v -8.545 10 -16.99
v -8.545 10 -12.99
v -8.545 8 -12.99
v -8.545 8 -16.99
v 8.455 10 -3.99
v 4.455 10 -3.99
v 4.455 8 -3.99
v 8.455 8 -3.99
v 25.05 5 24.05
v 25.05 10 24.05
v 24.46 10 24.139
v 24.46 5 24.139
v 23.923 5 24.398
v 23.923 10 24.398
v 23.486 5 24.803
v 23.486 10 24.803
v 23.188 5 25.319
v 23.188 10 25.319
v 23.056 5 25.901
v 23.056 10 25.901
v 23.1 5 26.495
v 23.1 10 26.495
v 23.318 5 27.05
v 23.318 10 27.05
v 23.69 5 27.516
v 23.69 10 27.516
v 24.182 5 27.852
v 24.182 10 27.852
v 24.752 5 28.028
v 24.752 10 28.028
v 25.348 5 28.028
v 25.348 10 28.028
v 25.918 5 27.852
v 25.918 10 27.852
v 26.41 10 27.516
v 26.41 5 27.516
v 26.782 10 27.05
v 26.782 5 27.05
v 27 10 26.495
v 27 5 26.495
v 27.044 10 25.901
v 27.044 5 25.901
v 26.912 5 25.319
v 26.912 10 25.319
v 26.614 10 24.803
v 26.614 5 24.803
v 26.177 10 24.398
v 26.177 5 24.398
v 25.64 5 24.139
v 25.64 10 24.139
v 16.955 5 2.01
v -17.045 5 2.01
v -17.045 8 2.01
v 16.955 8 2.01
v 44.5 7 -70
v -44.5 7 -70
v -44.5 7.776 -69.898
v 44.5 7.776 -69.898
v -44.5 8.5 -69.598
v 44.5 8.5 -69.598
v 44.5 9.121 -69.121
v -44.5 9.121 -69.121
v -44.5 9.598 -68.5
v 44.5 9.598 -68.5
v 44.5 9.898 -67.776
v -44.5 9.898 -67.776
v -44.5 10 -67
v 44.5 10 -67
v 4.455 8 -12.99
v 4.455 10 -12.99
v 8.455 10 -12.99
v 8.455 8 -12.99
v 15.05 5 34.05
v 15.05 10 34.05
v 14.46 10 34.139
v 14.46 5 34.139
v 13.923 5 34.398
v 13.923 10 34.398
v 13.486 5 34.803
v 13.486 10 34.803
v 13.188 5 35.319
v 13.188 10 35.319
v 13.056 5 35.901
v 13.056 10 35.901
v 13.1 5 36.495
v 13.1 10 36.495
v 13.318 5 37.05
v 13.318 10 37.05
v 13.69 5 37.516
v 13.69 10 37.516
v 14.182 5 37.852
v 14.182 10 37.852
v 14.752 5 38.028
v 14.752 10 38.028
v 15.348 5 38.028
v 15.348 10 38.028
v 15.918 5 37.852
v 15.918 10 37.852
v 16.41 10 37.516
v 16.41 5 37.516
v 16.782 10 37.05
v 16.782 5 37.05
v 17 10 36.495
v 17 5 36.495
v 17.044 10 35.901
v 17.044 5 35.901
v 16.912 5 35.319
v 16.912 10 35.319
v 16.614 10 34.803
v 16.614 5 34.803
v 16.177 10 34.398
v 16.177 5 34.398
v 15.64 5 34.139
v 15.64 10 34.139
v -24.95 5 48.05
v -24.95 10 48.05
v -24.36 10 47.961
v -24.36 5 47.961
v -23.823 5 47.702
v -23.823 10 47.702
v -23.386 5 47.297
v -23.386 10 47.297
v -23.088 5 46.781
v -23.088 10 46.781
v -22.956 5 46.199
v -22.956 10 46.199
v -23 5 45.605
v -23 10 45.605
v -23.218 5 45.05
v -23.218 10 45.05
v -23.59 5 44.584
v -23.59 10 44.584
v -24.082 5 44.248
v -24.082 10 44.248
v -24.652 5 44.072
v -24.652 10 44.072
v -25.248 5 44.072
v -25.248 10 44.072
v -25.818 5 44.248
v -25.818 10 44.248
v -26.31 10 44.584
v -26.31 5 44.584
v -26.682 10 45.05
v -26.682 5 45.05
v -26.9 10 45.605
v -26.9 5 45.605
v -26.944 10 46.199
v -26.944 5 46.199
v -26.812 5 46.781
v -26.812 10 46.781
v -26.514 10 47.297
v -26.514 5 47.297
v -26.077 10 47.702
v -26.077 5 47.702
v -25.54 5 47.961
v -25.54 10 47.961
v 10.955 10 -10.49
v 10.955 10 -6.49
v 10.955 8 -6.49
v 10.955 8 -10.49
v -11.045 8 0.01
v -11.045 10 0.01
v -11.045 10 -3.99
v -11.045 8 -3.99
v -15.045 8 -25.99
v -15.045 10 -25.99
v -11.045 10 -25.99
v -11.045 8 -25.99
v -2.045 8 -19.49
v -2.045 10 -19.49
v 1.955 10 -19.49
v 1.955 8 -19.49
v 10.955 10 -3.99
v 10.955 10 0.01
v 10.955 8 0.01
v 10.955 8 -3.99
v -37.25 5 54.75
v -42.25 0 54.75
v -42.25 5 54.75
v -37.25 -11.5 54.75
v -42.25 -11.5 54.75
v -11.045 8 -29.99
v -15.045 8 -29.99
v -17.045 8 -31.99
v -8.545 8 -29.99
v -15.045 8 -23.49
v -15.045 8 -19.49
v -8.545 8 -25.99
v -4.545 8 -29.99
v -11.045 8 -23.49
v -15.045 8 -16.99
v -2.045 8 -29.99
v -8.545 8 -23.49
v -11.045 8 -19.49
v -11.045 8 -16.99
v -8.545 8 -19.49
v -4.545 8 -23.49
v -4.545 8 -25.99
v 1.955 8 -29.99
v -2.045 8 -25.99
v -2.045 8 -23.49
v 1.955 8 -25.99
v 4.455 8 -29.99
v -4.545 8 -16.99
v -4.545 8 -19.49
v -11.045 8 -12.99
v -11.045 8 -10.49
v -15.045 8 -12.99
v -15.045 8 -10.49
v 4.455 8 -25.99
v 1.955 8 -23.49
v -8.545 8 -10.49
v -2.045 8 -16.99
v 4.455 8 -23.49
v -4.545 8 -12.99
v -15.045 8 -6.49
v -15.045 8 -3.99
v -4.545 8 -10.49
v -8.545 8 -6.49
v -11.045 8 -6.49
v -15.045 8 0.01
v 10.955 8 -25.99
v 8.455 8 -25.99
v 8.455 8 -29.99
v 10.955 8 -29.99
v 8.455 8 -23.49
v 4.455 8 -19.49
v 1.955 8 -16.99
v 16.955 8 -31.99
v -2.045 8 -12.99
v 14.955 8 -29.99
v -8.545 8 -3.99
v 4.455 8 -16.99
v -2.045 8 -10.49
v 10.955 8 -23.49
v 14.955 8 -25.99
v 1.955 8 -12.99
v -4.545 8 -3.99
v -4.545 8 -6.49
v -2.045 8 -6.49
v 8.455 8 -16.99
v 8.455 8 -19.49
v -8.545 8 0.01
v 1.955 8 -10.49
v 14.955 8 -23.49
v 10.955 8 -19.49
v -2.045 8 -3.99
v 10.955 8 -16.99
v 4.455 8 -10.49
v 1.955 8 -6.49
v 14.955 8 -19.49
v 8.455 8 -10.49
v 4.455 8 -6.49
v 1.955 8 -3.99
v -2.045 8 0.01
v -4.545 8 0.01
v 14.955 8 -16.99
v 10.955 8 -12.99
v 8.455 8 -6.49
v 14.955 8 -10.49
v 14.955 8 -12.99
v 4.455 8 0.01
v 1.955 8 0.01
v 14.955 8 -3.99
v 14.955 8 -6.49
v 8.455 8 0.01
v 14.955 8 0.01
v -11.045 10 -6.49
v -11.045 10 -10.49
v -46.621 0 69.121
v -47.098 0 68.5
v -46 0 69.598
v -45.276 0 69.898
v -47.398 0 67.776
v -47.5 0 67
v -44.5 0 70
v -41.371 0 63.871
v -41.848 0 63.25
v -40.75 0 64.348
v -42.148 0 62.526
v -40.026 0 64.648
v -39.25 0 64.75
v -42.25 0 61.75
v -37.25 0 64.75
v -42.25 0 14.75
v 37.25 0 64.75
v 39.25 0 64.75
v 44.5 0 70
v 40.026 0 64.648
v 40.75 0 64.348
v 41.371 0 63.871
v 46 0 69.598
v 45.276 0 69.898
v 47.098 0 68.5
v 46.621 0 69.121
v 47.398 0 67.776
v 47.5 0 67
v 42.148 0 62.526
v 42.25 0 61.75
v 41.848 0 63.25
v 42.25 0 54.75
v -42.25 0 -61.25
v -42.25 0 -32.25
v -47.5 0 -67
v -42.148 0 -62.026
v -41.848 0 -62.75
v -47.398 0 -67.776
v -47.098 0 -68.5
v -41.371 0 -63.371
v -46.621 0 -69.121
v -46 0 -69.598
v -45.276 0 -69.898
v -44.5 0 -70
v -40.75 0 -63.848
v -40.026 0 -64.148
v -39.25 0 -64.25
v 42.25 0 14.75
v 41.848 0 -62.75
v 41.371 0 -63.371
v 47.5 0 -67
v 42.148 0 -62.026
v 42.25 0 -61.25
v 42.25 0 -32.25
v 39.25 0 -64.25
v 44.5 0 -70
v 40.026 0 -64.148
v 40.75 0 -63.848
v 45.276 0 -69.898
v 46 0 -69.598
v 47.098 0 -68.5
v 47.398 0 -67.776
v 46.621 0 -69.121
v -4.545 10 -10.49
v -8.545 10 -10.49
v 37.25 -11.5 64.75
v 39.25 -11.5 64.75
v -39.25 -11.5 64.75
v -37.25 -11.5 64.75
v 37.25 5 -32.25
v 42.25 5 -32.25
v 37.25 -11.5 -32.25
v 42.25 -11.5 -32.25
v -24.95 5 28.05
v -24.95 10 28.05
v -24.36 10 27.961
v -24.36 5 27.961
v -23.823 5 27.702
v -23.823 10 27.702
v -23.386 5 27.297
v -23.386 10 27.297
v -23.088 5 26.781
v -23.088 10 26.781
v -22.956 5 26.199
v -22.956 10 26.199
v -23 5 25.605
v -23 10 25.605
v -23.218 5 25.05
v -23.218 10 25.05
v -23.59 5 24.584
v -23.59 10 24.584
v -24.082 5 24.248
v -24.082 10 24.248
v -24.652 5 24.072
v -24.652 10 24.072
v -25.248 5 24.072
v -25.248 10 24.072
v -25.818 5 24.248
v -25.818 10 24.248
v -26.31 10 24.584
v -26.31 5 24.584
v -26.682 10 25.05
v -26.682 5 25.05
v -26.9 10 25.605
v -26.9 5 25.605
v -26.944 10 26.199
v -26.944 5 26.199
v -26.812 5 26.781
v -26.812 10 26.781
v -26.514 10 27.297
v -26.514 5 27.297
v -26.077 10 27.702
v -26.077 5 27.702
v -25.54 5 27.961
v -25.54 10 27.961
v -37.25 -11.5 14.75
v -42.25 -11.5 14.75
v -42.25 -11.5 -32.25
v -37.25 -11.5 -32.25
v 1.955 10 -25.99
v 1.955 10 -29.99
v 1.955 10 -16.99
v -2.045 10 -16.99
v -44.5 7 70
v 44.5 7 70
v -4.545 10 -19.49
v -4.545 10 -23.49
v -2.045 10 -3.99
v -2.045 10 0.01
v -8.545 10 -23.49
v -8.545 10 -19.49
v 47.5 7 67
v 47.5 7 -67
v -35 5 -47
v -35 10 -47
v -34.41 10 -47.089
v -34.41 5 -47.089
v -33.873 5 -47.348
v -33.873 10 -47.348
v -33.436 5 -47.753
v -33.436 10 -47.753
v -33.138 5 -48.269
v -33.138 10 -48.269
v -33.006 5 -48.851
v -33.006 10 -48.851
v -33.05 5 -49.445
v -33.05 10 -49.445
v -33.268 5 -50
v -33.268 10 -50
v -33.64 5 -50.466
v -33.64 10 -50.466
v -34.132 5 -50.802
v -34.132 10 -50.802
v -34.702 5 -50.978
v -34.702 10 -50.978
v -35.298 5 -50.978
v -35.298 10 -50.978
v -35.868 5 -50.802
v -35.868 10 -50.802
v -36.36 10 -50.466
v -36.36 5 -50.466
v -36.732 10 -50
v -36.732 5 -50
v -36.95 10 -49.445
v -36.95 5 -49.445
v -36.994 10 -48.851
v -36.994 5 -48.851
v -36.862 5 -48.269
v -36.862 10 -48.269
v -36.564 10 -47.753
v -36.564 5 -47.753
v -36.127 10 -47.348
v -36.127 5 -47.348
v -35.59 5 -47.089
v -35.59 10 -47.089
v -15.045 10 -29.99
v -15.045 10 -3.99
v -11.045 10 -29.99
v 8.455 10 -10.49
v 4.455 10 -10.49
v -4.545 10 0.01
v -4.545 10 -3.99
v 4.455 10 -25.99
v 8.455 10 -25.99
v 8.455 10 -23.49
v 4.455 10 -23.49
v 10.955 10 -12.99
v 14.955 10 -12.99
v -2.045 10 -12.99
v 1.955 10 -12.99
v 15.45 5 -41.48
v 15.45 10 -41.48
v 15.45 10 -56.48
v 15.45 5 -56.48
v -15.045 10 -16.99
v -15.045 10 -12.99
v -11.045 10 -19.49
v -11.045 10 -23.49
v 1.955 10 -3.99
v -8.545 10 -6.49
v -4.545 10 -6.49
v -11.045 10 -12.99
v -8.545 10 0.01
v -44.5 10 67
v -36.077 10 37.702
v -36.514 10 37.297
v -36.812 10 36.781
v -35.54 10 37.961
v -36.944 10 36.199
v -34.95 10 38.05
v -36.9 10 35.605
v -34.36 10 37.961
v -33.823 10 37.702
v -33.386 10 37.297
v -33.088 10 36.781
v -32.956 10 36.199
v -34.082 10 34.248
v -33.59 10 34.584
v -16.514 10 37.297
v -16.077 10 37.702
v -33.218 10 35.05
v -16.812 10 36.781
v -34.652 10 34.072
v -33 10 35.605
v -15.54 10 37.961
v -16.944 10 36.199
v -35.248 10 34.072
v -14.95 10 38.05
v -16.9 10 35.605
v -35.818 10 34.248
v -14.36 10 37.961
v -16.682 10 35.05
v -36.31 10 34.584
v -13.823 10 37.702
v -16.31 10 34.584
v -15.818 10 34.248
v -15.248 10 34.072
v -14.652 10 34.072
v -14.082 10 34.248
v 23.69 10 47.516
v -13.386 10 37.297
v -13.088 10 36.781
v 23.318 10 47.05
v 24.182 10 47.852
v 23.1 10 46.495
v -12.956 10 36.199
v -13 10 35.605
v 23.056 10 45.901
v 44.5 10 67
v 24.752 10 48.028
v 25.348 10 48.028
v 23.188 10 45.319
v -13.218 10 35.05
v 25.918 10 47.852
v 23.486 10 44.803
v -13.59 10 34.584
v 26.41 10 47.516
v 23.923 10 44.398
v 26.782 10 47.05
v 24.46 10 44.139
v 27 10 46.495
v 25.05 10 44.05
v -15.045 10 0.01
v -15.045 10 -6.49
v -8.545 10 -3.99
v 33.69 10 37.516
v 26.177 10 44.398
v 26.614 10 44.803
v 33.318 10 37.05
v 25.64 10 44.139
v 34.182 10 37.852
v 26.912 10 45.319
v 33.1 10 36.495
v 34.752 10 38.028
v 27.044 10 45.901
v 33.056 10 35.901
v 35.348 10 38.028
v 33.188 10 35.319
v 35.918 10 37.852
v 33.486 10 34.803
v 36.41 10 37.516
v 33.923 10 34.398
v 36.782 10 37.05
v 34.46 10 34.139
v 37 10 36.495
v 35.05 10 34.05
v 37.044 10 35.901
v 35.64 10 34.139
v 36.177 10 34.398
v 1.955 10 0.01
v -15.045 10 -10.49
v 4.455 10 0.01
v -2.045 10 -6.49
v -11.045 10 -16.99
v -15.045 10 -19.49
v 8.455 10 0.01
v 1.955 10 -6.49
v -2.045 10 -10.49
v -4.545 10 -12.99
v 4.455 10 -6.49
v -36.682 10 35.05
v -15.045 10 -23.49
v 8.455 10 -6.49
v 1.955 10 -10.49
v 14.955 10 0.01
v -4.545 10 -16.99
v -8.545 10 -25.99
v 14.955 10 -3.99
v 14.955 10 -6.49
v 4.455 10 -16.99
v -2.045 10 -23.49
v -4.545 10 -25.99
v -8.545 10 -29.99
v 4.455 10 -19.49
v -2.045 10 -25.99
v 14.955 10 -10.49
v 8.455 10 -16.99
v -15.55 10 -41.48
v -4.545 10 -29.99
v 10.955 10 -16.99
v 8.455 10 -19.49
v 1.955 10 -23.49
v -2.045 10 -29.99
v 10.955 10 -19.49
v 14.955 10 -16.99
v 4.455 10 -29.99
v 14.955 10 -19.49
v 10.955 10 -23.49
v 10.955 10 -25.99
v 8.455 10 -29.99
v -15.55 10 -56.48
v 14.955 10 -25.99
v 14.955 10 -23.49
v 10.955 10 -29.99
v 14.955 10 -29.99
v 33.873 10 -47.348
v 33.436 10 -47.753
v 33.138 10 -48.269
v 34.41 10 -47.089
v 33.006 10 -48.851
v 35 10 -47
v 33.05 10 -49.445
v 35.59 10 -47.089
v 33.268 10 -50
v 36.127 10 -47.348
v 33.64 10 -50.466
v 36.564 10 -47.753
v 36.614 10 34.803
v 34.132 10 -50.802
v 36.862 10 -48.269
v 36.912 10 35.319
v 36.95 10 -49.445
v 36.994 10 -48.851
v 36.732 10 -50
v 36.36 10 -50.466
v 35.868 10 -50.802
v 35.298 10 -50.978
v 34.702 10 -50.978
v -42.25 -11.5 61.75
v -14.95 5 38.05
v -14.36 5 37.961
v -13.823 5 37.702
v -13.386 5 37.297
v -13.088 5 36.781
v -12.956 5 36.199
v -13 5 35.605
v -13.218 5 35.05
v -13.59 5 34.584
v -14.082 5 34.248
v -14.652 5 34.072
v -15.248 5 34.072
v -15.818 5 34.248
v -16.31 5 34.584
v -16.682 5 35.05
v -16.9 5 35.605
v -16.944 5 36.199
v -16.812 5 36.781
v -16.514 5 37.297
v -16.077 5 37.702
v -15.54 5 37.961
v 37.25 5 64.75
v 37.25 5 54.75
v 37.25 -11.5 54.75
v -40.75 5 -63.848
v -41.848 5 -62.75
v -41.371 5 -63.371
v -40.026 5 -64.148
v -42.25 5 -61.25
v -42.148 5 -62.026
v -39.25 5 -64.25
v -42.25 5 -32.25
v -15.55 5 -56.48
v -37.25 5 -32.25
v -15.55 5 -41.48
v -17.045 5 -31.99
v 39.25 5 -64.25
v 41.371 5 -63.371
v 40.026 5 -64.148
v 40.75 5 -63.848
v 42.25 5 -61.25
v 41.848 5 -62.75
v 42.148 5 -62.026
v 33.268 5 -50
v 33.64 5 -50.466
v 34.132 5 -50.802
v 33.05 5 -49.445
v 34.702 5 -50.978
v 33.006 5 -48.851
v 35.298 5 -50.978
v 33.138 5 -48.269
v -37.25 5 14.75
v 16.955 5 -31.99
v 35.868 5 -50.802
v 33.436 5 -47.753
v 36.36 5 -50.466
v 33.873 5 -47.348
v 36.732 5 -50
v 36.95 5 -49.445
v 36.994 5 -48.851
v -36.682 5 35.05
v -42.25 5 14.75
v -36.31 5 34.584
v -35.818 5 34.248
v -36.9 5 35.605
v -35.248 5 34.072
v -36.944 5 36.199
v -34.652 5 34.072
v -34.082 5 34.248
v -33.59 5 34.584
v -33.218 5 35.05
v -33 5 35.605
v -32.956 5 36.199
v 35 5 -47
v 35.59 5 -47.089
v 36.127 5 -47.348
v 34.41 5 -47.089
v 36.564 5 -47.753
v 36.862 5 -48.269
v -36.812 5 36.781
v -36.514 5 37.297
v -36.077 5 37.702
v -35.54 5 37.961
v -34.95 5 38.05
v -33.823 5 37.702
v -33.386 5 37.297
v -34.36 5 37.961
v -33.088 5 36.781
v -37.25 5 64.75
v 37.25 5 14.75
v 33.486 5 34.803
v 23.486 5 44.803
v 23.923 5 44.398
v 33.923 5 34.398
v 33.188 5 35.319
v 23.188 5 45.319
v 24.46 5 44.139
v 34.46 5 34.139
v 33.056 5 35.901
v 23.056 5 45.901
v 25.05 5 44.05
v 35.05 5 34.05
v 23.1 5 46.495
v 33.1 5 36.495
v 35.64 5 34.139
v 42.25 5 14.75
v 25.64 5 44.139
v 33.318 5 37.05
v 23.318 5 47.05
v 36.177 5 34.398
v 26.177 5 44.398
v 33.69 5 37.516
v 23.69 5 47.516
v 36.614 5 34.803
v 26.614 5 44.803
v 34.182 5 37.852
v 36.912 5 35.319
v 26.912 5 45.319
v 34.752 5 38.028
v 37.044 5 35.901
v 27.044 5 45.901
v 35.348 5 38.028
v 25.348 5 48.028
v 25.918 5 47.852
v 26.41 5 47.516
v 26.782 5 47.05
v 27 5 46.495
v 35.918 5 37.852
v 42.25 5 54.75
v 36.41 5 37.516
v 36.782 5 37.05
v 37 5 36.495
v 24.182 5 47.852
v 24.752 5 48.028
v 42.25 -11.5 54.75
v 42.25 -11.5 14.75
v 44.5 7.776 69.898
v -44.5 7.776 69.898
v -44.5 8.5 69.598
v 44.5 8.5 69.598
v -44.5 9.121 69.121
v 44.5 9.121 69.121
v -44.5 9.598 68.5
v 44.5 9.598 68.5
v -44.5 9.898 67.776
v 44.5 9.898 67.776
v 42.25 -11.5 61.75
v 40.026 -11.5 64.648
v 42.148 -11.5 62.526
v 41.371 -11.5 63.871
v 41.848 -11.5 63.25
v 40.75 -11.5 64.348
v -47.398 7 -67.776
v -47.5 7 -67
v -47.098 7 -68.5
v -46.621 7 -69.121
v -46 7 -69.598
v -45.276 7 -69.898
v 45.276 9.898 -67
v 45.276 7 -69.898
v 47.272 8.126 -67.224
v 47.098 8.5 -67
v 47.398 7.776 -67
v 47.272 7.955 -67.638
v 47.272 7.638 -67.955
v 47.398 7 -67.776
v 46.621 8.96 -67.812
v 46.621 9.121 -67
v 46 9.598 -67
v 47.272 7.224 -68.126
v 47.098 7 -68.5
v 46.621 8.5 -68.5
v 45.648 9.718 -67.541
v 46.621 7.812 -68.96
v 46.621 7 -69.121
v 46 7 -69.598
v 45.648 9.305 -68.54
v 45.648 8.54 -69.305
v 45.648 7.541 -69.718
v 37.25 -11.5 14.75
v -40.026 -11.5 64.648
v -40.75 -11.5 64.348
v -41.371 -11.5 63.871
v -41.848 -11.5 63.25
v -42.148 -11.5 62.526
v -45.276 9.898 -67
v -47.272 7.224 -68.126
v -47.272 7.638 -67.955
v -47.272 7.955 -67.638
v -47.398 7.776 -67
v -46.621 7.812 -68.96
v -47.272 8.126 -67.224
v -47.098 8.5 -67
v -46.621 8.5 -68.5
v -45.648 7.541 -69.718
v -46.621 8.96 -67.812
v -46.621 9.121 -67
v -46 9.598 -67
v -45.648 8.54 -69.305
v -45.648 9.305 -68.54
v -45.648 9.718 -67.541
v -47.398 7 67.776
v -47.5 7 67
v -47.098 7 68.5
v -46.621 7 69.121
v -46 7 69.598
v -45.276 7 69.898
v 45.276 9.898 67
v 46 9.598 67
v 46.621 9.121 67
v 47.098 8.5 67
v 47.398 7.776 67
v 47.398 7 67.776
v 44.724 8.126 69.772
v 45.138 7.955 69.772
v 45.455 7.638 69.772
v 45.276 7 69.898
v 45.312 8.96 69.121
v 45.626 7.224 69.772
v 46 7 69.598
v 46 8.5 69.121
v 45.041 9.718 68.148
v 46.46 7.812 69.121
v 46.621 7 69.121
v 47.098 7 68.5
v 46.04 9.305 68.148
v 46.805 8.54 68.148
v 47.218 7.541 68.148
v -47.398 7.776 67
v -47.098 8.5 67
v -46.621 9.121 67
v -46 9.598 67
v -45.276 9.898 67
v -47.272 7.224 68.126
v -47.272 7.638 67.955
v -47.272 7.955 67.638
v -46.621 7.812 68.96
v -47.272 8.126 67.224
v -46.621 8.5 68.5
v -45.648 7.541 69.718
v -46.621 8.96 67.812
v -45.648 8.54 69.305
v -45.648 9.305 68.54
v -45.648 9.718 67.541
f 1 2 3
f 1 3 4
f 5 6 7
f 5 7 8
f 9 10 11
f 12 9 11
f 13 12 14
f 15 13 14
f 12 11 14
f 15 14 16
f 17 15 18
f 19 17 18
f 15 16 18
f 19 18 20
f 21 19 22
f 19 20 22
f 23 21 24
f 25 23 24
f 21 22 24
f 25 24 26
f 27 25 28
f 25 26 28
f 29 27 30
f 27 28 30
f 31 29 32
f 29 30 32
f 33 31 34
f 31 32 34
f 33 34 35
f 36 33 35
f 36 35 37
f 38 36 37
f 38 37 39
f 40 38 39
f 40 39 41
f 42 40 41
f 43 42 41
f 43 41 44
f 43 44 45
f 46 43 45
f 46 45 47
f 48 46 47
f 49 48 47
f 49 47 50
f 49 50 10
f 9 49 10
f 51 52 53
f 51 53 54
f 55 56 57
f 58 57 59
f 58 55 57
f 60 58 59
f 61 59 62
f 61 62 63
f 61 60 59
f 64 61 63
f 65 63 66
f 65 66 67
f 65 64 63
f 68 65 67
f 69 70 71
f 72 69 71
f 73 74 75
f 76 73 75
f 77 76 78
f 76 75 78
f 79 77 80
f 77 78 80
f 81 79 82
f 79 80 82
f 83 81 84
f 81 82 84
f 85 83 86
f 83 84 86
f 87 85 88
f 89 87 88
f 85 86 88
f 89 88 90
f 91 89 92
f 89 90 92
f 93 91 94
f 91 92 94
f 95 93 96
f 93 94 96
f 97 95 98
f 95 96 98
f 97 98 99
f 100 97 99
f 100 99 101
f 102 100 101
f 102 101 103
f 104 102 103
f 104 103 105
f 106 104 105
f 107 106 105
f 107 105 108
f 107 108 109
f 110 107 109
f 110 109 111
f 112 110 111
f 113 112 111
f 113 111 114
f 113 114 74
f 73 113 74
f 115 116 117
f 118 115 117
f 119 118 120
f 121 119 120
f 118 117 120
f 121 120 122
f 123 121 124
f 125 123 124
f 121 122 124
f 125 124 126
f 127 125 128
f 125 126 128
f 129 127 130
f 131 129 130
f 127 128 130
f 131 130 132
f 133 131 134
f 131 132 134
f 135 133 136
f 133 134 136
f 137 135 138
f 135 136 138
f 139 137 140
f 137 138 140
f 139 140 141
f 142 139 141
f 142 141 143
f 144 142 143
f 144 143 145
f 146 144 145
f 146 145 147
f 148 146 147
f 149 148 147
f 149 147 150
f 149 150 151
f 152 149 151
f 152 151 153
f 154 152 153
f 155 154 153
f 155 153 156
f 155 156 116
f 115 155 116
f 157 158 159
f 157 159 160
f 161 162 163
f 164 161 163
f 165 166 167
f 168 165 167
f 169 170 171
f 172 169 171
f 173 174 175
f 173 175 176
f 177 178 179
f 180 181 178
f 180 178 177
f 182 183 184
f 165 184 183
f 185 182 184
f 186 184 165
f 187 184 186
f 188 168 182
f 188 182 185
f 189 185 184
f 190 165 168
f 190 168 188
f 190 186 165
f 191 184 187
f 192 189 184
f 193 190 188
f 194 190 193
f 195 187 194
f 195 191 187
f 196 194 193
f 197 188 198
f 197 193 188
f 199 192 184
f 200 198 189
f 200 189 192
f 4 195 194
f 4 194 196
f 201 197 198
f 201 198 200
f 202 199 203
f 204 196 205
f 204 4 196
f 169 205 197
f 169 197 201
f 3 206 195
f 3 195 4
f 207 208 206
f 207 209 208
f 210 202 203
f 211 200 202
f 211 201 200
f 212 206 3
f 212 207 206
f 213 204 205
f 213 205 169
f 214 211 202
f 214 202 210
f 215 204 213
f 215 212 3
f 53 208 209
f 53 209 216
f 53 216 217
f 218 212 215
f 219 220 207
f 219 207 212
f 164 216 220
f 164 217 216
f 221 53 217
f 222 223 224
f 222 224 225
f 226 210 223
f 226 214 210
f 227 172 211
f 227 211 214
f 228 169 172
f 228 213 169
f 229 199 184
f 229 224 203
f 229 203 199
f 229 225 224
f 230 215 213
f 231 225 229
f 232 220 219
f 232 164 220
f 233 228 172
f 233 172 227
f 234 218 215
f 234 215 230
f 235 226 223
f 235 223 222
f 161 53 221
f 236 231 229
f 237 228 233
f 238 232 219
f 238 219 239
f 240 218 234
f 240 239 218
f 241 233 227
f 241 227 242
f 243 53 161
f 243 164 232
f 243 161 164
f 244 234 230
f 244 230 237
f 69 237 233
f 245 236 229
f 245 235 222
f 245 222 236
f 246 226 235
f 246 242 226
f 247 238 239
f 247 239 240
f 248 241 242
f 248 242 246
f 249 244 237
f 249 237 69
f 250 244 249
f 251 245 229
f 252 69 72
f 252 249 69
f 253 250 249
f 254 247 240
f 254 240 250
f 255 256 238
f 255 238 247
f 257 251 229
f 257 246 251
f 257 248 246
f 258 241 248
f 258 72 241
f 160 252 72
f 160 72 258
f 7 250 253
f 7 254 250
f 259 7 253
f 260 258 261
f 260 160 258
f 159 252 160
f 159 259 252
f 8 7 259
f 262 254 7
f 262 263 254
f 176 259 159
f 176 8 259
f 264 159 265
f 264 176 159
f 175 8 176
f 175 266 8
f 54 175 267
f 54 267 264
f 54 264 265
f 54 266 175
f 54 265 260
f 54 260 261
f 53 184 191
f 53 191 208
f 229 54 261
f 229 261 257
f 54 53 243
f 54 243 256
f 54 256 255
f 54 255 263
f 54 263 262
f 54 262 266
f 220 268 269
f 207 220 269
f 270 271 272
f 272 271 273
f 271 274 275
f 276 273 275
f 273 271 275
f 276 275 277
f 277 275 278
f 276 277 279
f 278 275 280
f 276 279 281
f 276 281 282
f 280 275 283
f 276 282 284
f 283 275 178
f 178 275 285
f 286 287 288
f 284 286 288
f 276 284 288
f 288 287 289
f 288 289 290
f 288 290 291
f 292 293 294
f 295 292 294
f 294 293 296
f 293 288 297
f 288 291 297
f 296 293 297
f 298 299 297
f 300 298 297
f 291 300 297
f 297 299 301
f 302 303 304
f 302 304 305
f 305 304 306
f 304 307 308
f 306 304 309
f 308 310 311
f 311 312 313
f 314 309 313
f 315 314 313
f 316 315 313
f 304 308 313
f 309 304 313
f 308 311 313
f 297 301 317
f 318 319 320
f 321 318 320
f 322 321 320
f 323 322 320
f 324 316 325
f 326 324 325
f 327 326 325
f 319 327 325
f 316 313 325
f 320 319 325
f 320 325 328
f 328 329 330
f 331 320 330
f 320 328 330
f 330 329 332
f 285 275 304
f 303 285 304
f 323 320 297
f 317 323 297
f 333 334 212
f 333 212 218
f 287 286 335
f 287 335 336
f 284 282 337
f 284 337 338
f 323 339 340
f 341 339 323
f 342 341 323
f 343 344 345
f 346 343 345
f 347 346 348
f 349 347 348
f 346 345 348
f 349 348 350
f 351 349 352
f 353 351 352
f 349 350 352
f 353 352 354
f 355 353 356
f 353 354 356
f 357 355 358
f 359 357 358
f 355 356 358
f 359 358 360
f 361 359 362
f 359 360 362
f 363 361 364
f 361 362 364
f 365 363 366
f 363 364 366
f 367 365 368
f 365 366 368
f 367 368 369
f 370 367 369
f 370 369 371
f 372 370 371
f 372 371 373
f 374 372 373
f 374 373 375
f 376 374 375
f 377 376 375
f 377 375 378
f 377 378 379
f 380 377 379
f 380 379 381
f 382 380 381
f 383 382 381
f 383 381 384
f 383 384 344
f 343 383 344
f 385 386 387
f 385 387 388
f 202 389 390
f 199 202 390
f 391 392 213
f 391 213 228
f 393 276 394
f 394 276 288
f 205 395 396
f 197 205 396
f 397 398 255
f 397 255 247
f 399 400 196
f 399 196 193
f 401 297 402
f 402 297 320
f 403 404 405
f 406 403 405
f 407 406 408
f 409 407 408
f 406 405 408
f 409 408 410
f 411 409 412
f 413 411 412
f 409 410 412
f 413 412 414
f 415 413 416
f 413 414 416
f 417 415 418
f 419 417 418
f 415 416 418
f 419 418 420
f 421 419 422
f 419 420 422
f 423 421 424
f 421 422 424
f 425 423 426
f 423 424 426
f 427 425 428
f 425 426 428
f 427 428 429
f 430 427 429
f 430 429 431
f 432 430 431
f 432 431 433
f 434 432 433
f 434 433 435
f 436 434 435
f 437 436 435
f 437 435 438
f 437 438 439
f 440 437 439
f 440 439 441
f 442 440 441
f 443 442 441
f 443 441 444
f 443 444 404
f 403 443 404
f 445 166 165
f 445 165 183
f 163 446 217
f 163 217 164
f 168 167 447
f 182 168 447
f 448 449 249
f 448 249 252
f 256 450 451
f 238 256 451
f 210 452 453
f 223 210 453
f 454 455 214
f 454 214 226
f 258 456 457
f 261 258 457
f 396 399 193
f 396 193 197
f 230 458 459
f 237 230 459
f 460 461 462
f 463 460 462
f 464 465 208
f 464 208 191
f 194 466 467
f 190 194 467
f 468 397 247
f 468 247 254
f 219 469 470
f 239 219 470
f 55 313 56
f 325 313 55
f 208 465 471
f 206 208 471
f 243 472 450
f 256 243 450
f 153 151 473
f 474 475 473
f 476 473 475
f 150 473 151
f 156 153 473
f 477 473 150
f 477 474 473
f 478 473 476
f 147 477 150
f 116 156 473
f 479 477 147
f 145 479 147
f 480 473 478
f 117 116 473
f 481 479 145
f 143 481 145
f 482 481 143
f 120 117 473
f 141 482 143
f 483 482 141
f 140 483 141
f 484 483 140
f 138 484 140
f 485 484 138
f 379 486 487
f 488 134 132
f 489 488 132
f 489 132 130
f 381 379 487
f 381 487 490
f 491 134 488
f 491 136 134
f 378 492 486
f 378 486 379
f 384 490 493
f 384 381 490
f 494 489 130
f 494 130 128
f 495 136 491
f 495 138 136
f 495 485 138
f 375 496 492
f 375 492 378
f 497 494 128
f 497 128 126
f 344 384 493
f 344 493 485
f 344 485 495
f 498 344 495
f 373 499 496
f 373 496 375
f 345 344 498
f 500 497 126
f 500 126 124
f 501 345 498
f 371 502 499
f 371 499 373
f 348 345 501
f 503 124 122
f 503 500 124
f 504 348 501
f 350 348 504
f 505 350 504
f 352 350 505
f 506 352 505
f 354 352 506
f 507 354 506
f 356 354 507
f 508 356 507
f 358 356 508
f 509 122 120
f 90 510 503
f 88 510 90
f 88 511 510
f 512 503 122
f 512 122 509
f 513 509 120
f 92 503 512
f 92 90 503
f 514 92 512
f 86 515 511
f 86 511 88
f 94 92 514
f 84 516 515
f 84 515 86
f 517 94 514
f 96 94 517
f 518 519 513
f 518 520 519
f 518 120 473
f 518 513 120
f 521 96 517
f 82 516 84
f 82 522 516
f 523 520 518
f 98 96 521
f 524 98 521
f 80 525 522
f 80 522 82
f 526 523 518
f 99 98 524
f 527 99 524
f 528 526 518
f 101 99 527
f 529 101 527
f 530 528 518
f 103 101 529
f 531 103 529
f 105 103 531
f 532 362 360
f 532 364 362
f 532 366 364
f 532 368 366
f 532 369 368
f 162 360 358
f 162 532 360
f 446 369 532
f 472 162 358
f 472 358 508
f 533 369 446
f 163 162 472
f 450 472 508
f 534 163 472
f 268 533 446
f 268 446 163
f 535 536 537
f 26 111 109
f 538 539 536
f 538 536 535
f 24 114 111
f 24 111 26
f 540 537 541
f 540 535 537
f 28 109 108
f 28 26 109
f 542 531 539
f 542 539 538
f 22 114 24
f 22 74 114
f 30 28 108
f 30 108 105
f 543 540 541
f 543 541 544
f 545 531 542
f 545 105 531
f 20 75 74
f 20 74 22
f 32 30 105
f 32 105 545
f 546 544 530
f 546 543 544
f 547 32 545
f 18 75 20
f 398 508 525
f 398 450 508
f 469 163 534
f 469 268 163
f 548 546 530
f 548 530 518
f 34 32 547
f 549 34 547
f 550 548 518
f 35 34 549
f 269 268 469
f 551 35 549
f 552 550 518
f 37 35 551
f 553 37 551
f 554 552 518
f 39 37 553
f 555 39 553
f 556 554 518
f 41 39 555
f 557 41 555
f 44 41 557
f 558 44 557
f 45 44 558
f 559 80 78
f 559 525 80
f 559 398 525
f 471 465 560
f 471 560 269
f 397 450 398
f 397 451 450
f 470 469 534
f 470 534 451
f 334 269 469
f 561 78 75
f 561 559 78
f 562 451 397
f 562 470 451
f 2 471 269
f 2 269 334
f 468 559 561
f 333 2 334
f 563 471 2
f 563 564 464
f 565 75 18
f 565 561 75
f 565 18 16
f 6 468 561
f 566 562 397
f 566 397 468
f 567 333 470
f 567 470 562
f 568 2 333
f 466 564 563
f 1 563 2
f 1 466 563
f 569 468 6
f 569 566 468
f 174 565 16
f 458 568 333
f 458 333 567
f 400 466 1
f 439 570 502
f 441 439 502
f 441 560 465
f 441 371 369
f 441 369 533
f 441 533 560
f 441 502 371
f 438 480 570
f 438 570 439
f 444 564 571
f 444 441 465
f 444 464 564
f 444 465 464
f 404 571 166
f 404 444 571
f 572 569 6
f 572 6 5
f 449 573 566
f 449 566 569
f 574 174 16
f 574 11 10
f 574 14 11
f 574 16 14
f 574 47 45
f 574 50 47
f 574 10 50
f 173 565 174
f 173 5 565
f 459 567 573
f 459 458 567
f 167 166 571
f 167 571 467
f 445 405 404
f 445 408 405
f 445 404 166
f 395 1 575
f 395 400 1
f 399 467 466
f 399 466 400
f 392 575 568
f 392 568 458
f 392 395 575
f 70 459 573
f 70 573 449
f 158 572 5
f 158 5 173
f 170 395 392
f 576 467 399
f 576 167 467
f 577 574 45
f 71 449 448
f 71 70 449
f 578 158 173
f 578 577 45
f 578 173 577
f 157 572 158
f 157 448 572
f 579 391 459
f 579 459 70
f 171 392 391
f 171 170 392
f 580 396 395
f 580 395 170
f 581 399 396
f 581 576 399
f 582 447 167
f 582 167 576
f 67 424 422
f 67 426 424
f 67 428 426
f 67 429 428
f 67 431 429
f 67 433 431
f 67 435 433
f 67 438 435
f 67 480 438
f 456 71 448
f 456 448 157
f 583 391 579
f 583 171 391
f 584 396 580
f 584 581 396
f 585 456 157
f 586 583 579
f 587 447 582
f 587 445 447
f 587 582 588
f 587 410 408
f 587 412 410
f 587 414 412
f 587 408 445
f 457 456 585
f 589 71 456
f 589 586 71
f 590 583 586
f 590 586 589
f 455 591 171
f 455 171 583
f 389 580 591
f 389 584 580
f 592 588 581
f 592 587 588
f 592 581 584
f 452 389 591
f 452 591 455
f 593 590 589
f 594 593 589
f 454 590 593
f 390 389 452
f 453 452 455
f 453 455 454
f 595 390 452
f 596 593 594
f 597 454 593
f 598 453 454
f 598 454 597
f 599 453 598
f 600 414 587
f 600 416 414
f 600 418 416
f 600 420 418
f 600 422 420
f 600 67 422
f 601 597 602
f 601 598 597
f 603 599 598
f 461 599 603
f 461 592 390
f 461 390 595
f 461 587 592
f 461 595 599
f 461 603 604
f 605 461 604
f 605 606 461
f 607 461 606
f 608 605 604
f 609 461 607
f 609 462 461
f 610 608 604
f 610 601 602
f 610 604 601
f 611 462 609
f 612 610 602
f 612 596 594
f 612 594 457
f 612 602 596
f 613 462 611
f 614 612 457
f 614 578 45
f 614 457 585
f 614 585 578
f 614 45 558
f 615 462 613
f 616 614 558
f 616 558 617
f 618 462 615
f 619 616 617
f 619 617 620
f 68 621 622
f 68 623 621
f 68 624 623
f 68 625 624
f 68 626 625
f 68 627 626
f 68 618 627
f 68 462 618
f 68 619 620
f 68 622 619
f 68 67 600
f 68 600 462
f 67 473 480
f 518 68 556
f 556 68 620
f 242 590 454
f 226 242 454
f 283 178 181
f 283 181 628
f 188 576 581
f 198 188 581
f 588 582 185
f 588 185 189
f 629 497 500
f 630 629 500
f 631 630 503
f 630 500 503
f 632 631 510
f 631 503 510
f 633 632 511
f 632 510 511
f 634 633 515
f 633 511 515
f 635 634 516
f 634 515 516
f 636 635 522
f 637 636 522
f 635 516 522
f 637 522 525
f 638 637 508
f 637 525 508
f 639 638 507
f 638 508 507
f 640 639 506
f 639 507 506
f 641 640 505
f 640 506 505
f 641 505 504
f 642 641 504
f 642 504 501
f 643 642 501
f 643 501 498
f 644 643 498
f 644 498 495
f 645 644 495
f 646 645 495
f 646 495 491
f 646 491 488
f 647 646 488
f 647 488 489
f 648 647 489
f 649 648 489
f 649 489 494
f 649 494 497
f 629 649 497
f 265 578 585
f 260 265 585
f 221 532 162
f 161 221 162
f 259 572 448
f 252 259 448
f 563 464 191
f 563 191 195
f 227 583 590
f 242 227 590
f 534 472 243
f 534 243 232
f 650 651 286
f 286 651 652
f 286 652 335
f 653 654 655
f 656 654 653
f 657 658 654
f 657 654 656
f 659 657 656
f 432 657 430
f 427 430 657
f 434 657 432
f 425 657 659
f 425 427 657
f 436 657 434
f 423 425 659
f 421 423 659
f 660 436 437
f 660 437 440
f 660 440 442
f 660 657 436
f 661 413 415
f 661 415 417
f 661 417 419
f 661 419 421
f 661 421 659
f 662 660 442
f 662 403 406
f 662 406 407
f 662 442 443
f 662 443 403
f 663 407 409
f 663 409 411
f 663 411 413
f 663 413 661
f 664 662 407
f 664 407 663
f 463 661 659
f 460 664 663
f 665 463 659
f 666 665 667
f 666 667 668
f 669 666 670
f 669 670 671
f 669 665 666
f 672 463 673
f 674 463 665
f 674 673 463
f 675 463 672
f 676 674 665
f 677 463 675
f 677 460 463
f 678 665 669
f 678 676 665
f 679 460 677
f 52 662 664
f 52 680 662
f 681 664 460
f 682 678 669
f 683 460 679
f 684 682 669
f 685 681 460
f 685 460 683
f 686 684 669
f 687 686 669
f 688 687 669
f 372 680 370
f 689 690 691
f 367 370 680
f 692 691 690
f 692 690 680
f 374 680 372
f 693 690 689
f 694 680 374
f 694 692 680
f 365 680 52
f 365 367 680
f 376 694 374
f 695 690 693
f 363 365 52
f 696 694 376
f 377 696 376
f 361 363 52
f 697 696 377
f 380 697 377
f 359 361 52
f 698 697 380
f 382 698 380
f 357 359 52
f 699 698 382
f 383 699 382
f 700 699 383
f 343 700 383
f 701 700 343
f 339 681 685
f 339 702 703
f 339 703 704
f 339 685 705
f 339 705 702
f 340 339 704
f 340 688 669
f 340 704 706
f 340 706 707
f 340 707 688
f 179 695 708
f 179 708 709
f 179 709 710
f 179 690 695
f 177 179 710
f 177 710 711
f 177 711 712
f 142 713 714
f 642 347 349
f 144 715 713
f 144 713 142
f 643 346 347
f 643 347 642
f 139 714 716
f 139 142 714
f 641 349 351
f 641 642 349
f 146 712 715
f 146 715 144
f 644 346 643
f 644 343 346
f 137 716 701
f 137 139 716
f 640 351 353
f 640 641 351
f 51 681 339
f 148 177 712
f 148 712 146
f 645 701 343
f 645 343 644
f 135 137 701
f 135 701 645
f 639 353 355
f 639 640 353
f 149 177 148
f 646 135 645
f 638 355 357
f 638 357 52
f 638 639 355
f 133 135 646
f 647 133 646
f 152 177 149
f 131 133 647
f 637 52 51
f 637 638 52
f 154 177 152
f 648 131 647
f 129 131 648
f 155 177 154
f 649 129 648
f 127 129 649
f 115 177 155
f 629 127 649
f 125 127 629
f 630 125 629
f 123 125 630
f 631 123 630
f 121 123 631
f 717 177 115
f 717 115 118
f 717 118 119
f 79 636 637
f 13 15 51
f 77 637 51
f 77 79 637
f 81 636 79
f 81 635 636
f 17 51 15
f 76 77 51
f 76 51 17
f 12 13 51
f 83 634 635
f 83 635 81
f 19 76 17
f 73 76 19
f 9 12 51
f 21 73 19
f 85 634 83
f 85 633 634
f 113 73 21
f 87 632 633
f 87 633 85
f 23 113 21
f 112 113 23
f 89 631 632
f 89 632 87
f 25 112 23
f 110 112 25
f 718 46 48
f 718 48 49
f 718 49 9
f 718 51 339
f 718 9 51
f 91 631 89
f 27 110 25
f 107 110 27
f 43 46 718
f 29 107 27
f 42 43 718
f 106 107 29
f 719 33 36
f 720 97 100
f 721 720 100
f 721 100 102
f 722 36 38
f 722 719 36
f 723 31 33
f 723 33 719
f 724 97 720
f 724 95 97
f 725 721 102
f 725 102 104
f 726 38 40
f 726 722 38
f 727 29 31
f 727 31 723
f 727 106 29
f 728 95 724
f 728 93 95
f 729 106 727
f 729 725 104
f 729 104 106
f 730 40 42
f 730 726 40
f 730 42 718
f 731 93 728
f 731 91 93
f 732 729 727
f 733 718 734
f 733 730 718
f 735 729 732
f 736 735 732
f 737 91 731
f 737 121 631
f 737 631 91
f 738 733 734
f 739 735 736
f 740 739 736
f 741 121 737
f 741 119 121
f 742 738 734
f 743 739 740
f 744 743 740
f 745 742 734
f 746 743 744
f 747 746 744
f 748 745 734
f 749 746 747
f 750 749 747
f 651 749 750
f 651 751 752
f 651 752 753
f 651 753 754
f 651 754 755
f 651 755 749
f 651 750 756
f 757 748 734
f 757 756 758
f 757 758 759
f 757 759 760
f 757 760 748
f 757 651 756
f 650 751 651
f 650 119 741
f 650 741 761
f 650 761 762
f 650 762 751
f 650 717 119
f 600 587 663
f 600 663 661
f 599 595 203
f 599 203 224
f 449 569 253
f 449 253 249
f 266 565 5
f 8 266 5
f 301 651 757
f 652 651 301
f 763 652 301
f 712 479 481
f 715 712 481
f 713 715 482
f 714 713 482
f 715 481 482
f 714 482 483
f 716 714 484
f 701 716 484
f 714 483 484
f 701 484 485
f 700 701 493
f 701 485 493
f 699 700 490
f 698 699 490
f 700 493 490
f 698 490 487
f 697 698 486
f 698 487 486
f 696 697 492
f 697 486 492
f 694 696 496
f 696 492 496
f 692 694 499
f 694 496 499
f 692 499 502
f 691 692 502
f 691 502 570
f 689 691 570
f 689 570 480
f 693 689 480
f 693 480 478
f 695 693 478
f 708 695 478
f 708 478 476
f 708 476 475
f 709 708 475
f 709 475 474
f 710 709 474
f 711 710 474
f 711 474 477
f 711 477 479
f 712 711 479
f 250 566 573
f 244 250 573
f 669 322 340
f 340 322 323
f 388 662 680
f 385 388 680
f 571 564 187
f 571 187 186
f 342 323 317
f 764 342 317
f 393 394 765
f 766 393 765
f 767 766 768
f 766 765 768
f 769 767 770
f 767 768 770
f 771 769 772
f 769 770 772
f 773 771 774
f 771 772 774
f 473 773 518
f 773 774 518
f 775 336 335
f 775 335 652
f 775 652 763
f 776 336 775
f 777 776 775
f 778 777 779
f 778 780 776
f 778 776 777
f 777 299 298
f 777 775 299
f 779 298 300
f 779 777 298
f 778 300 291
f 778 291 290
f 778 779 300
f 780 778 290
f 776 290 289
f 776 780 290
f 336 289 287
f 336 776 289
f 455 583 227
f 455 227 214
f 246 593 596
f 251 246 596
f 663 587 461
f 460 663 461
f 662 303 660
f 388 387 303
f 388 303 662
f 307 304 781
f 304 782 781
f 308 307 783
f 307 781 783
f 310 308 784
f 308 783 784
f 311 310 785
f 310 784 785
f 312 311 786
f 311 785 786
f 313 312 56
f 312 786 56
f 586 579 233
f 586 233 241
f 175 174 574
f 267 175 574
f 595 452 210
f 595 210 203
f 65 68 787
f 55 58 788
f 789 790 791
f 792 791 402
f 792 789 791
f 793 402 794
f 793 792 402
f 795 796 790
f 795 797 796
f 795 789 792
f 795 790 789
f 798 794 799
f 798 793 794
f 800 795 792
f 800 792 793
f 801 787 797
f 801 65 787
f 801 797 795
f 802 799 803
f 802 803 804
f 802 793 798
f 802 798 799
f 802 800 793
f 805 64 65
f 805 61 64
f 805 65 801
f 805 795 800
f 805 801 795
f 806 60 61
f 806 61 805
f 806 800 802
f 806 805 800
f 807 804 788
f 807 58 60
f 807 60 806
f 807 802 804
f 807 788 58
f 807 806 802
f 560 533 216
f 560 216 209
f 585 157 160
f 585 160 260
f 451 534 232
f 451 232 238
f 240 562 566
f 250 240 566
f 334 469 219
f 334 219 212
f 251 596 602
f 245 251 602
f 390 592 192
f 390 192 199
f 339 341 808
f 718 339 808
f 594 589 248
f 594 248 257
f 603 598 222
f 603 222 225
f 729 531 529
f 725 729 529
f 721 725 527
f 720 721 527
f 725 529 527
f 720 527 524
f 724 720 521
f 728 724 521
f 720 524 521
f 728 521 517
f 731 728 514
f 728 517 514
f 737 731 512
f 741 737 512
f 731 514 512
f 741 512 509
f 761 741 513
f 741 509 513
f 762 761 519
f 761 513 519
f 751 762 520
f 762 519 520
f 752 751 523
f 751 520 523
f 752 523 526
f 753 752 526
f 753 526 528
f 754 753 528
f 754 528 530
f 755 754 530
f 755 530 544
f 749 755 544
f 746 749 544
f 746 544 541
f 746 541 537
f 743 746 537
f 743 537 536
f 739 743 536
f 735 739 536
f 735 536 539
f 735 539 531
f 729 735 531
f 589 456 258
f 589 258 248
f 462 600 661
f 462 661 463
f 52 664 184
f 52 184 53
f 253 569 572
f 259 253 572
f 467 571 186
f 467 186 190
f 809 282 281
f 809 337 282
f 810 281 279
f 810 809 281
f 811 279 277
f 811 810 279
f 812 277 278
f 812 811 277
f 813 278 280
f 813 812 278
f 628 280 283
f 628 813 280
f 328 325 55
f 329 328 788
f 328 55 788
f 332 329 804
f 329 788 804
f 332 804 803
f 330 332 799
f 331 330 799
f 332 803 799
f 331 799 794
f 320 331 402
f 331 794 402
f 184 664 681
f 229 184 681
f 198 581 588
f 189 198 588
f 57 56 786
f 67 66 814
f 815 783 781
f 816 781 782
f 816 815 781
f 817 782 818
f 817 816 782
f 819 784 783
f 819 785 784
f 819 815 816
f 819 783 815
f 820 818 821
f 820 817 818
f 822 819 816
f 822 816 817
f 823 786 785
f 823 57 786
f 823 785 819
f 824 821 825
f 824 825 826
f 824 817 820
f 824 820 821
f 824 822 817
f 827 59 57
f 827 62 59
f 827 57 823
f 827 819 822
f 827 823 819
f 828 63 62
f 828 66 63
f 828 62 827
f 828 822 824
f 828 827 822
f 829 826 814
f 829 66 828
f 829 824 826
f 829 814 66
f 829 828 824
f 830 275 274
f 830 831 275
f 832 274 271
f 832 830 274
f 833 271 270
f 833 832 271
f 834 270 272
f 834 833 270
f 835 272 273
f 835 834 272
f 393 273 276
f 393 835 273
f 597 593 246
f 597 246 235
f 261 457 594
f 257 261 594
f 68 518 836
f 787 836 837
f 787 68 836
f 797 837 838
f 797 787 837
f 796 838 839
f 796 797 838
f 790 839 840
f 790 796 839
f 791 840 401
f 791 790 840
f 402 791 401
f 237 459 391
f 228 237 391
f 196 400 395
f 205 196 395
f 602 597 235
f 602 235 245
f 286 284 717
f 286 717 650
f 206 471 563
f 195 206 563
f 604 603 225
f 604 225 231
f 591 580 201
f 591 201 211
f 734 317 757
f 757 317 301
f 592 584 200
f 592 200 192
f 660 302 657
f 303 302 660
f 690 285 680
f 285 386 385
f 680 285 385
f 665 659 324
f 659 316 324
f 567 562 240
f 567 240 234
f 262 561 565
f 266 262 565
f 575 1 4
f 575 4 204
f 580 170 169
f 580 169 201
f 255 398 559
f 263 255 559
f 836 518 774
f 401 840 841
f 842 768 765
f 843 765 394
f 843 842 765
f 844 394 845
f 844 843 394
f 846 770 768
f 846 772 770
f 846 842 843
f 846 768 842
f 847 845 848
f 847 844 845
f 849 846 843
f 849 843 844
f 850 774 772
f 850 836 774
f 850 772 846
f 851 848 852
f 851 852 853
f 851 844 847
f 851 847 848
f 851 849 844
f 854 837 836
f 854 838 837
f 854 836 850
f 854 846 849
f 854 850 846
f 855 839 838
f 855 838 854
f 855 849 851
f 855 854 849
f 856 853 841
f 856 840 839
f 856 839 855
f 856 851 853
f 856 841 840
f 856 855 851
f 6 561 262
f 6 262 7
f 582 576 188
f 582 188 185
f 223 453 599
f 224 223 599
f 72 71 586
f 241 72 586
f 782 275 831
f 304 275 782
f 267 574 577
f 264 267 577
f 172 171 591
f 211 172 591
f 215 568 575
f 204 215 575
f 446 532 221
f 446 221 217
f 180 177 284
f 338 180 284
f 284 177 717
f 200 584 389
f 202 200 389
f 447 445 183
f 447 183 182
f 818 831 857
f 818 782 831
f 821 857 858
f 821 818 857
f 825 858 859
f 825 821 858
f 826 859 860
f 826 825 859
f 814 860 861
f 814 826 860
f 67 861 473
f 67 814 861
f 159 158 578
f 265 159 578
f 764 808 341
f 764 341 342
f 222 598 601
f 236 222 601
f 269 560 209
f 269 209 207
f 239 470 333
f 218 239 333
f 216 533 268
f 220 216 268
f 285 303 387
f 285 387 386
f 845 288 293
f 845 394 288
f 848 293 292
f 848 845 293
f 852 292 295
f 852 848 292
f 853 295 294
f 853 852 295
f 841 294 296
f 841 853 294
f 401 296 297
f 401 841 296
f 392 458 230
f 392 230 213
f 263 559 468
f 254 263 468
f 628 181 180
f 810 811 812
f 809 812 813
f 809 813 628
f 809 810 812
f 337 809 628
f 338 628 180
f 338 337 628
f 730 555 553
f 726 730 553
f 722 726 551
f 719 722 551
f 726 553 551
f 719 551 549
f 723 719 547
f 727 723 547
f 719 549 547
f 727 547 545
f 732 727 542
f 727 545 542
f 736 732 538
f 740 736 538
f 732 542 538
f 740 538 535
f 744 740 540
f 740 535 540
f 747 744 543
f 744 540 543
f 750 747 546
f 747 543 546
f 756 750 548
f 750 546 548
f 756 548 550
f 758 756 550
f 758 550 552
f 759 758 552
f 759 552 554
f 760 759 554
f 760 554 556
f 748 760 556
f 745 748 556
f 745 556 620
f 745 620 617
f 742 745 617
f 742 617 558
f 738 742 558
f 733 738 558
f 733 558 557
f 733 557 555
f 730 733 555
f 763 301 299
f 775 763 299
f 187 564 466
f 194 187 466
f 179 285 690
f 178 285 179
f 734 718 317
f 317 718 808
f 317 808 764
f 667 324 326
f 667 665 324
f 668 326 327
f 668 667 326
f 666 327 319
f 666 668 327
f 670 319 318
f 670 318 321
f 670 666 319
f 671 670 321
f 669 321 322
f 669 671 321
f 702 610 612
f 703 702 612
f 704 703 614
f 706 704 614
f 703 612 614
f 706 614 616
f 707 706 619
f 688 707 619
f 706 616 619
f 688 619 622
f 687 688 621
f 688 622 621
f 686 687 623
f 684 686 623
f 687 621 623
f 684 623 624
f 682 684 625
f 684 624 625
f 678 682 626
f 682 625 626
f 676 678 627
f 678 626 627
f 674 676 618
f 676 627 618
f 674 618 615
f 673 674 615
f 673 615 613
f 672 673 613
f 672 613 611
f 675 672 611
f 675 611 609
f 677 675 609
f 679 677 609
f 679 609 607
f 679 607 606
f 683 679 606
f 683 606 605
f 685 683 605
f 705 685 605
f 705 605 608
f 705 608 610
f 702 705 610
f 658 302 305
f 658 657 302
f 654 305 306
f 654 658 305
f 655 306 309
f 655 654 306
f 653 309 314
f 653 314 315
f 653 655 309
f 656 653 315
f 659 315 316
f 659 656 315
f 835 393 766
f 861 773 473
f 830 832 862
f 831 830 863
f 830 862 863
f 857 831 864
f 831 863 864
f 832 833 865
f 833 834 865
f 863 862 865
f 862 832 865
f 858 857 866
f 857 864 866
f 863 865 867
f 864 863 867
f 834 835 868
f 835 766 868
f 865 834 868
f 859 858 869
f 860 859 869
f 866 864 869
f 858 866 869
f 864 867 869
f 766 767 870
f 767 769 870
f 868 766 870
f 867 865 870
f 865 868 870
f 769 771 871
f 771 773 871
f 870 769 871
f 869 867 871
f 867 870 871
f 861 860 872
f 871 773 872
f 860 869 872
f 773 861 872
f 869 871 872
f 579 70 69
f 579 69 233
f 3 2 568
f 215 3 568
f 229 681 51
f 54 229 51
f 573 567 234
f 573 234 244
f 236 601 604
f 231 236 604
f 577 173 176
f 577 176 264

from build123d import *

# Parameters (mm, degrees)
SKETCH1_W           = 95
SKETCH1_H           = 140
BOSS_EXTRUDE1_DEPTH = 10
SKETCH7_W           = 5
SKETCH7_H           = 129
BOSS_EXTRUDE3_DEPTH = 11.5
SKETCH8_R           = 2
SKETCH8_W           = 31
SKETCH8_H           = 15
CUT_EXTRUDE1_DEPTH  = 10
SKETCH14_W          = 34
SKETCH14_H          = 34
CUT_EXTRUDE3_DEPTH  = 8
SKETCH13_W          = 4
SKETCH13_H          = 4
CUT_EXTRUDE4_DEPTH  = 7
SKETCH15_W          = 74.5
SKETCH15_H          = 129
CUT_EXTRUDE5_DEPTH  = 5
CUT_EXTRUDE8_REACH  = 89.284
SKETCH18_W          = 5
SKETCH18_H          = 32
SKETCH18_H_2        = 40
FILLET1_R           = 3


with BuildPart() as part:
    # Sketch1 → Boss-Extrude1 (new body)
    with BuildSketch(Plane(origin=(0, 0, 0), x_dir=(1, 0, 0), z_dir=(0, 1, 0))):
        Rectangle(SKETCH1_W, SKETCH1_H)
    extrude(amount=BOSS_EXTRUDE1_DEPTH)

    # Sketch7 → Boss-Extrude3 (add)
    with BuildSketch(Plane.XZ):
        with Locations((-39.75, 0.25)):
            Rectangle(SKETCH7_W, SKETCH7_H)
        with Locations((39.75, 0.25)):
            Rectangle(SKETCH7_W, SKETCH7_H)
    extrude(amount=BOSS_EXTRUDE3_DEPTH)

    # Sketch8 → Cut-Extrude1 (cut)
    with BuildSketch(Plane(origin=(0, 10, 0), x_dir=(1, 0, 0), z_dir=(0, 1, 0))):
        with Locations(Location((-35, 49, 0), (0, 0, 270))):
            Circle(SKETCH8_R)
        with Locations(Location((35, 49, 0), (0, 0, 270))):
            Circle(SKETCH8_R)
        with Locations(Location((-14.95, -36.05, 0), (0, 0, 270))):
            Circle(SKETCH8_R)
        with Locations(Location((-34.95, -36.05, 0), (0, 0, 270))):
            Circle(SKETCH8_R)
        with Locations(Location((-24.95, -46.05, 0), (0, 0, 270))):
            Circle(SKETCH8_R)
        with Locations(Location((-24.95, -26.05, 0), (0, 0, 270))):
            Circle(SKETCH8_R)
        with Locations(Location((25.05, -26.05, 0), (0, 0, 90))):
            Circle(SKETCH8_R)
        with Locations(Location((35.05, -36.05, 0), (0, 0, 90))):
            Circle(SKETCH8_R)
        with Locations(Location((25.05, -46.05, 0), (0, 0, 90))):
            Circle(SKETCH8_R)
        with Locations(Location((15.05, -36.05, 0), (0, 0, 90))):
            Circle(SKETCH8_R)
        with Locations((-0.05, 48.98)):
            Rectangle(SKETCH8_W, SKETCH8_H)
    extrude(amount=-CUT_EXTRUDE1_DEPTH, mode=Mode.SUBTRACT)

    # Sketch14 → Cut-Extrude3 (cut)
    with BuildSketch(Plane.XZ):
        with Locations((-0.045, -14.99)):
            Rectangle(SKETCH14_W, SKETCH14_H)
    extrude(amount=-CUT_EXTRUDE3_DEPTH, mode=Mode.SUBTRACT)

    # Sketch13 → Cut-Extrude4 (cut)
    with BuildSketch(Plane(origin=(0, 10, 0), x_dir=(1, 0, 0), z_dir=(0, 1, 0))):
        with Locations((-6.545, 27.99)):
            Rectangle(SKETCH13_W, SKETCH13_H)
        with Locations((-13.045, 27.99)):
            Rectangle(SKETCH13_W, SKETCH13_H)
        with Locations((-0.045, 27.99)):
            Rectangle(SKETCH13_W, SKETCH13_H)
        with Locations((6.455, 27.99)):
            Rectangle(SKETCH13_W, SKETCH13_H)
        with Locations((12.955, 27.99)):
            Rectangle(SKETCH13_W, SKETCH13_H)
        with Locations((-6.545, 21.49)):
            Rectangle(SKETCH13_W, SKETCH13_H)
        with Locations((-0.045, 21.49)):
            Rectangle(SKETCH13_W, SKETCH13_H)
        with Locations((6.455, 21.49)):
            Rectangle(SKETCH13_W, SKETCH13_H)
        with Locations((12.955, 21.49)):
            Rectangle(SKETCH13_W, SKETCH13_H)
        with Locations((-6.545, 14.99)):
            Rectangle(SKETCH13_W, SKETCH13_H)
        with Locations((-0.045, 14.99)):
            Rectangle(SKETCH13_W, SKETCH13_H)
        with Locations((6.455, 14.99)):
            Rectangle(SKETCH13_W, SKETCH13_H)
        with Locations((12.955, 14.99)):
            Rectangle(SKETCH13_W, SKETCH13_H)
        with Locations((-6.545, 8.49)):
            Rectangle(SKETCH13_W, SKETCH13_H)
        with Locations((-0.045, 8.49)):
            Rectangle(SKETCH13_W, SKETCH13_H)
        with Locations((6.455, 8.49)):
            Rectangle(SKETCH13_W, SKETCH13_H)
        with Locations((12.955, 8.49)):
            Rectangle(SKETCH13_W, SKETCH13_H)
        with Locations((-6.545, 1.99)):
            Rectangle(SKETCH13_W, SKETCH13_H)
        with Locations((-0.045, 1.99)):
            Rectangle(SKETCH13_W, SKETCH13_H)
        with Locations((6.455, 1.99)):
            Rectangle(SKETCH13_W, SKETCH13_H)
        with Locations((12.955, 1.99)):
            Rectangle(SKETCH13_W, SKETCH13_H)
        with Locations((-13.045, 21.49)):
            Rectangle(SKETCH13_W, SKETCH13_H)
        with Locations((-13.045, 14.99)):
            Rectangle(SKETCH13_W, SKETCH13_H)
        with Locations((-13.045, 8.49)):
            Rectangle(SKETCH13_W, SKETCH13_H)
        with Locations((-13.045, 1.99)):
            Rectangle(SKETCH13_W, SKETCH13_H)
    extrude(amount=-CUT_EXTRUDE4_DEPTH, mode=Mode.SUBTRACT)

    # Sketch15 → Cut-Extrude5 (cut)
    with BuildSketch(Plane.XZ):
        with Locations((0, 0.25)):
            Rectangle(SKETCH15_W, SKETCH15_H)
    extrude(amount=-CUT_EXTRUDE5_DEPTH, mode=Mode.SUBTRACT)

    # Cut-Extrude8: up to this face of the body (flat: up to its plane)
    cut_extrude8_end = Plane(part.part.faces().sort_by_distance((0.008932466, 5, 5.101088901))[0])
    # Sketch18 → Cut-Extrude8 (cut, up to the picked face)
    with BuildSketch(Plane.XZ.offset(11.5), mode=Mode.PRIVATE) as cut_extrude8_sk1:
        with Locations((-39.75, -48.25)):
            Rectangle(SKETCH18_W, SKETCH18_H)
    cut_extrude8_tool1 = split(extrude(cut_extrude8_sk1.sketch, amount=-CUT_EXTRUDE8_REACH, mode=Mode.PRIVATE), bisect_by=cut_extrude8_end, keep=Keep.BOTH, mode=Mode.PRIVATE)
    # Sketch18 → Cut-Extrude8 (cut, up to the picked face)
    with BuildSketch(Plane.XZ.offset(11.5), mode=Mode.PRIVATE) as cut_extrude8_sk2:
        with Locations((-39.75, 34.75)):
            Rectangle(SKETCH18_W, SKETCH18_H_2)
    cut_extrude8_tool2 = split(extrude(cut_extrude8_sk2.sketch, amount=-CUT_EXTRUDE8_REACH, mode=Mode.PRIVATE), bisect_by=cut_extrude8_end, keep=Keep.BOTH, mode=Mode.PRIVATE)
    # Sketch18 → Cut-Extrude8 (cut, up to the picked face)
    with BuildSketch(Plane.XZ.offset(11.5), mode=Mode.PRIVATE) as cut_extrude8_sk3:
        with Locations((39.75, -48.25)):
            Rectangle(SKETCH18_W, SKETCH18_H)
    cut_extrude8_tool3 = split(extrude(cut_extrude8_sk3.sketch, amount=-CUT_EXTRUDE8_REACH, mode=Mode.PRIVATE), bisect_by=cut_extrude8_end, keep=Keep.BOTH, mode=Mode.PRIVATE)
    # Sketch18 → Cut-Extrude8 (cut, up to the picked face)
    with BuildSketch(Plane.XZ.offset(11.5), mode=Mode.PRIVATE) as cut_extrude8_sk4:
        with Locations((39.75, 34.75)):
            Rectangle(SKETCH18_W, SKETCH18_H_2)
    cut_extrude8_tool4 = split(extrude(cut_extrude8_sk4.sketch, amount=-CUT_EXTRUDE8_REACH, mode=Mode.PRIVATE), bisect_by=cut_extrude8_end, keep=Keep.BOTH, mode=Mode.PRIVATE)
    add(cut_extrude8_tool1.solids().sort_by(Axis((-39.75, -11.5, -48.25), (0, 1, 0)))[0], mode=Mode.SUBTRACT)
    add(cut_extrude8_tool2.solids().sort_by(Axis((-39.75, -11.5, 34.75), (0, 1, 0)))[0], mode=Mode.SUBTRACT)
    add(cut_extrude8_tool3.solids().sort_by(Axis((39.75, -11.5, -48.25), (0, 1, 0)))[0], mode=Mode.SUBTRACT)
    add(cut_extrude8_tool4.solids().sort_by(Axis((39.75, -11.5, 34.75), (0, 1, 0)))[0], mode=Mode.SUBTRACT)

    # Fillet1
    fillet1_edges = [part.edges().sort_by_distance(p)[0] for p in [
        (0, 10, -70),
        (47.5, 10, 0),
        (-42.25, -5.75, 64.75),
        (42.25, -5.75, 64.75),
        (0, 10, 70),
        (42.25, 2.5, -64.25),
        (-42.25, 2.5, -64.25),
        (47.5, 5, 70),
        (47.5, 5, -70),
        (-47.5, 5, -70),
        (-47.5, 5, 70),
        (-47.5, 10, 0),
    ]]
    fillet(fillet1_edges, radius=FILLET1_R)


solid = part.part
